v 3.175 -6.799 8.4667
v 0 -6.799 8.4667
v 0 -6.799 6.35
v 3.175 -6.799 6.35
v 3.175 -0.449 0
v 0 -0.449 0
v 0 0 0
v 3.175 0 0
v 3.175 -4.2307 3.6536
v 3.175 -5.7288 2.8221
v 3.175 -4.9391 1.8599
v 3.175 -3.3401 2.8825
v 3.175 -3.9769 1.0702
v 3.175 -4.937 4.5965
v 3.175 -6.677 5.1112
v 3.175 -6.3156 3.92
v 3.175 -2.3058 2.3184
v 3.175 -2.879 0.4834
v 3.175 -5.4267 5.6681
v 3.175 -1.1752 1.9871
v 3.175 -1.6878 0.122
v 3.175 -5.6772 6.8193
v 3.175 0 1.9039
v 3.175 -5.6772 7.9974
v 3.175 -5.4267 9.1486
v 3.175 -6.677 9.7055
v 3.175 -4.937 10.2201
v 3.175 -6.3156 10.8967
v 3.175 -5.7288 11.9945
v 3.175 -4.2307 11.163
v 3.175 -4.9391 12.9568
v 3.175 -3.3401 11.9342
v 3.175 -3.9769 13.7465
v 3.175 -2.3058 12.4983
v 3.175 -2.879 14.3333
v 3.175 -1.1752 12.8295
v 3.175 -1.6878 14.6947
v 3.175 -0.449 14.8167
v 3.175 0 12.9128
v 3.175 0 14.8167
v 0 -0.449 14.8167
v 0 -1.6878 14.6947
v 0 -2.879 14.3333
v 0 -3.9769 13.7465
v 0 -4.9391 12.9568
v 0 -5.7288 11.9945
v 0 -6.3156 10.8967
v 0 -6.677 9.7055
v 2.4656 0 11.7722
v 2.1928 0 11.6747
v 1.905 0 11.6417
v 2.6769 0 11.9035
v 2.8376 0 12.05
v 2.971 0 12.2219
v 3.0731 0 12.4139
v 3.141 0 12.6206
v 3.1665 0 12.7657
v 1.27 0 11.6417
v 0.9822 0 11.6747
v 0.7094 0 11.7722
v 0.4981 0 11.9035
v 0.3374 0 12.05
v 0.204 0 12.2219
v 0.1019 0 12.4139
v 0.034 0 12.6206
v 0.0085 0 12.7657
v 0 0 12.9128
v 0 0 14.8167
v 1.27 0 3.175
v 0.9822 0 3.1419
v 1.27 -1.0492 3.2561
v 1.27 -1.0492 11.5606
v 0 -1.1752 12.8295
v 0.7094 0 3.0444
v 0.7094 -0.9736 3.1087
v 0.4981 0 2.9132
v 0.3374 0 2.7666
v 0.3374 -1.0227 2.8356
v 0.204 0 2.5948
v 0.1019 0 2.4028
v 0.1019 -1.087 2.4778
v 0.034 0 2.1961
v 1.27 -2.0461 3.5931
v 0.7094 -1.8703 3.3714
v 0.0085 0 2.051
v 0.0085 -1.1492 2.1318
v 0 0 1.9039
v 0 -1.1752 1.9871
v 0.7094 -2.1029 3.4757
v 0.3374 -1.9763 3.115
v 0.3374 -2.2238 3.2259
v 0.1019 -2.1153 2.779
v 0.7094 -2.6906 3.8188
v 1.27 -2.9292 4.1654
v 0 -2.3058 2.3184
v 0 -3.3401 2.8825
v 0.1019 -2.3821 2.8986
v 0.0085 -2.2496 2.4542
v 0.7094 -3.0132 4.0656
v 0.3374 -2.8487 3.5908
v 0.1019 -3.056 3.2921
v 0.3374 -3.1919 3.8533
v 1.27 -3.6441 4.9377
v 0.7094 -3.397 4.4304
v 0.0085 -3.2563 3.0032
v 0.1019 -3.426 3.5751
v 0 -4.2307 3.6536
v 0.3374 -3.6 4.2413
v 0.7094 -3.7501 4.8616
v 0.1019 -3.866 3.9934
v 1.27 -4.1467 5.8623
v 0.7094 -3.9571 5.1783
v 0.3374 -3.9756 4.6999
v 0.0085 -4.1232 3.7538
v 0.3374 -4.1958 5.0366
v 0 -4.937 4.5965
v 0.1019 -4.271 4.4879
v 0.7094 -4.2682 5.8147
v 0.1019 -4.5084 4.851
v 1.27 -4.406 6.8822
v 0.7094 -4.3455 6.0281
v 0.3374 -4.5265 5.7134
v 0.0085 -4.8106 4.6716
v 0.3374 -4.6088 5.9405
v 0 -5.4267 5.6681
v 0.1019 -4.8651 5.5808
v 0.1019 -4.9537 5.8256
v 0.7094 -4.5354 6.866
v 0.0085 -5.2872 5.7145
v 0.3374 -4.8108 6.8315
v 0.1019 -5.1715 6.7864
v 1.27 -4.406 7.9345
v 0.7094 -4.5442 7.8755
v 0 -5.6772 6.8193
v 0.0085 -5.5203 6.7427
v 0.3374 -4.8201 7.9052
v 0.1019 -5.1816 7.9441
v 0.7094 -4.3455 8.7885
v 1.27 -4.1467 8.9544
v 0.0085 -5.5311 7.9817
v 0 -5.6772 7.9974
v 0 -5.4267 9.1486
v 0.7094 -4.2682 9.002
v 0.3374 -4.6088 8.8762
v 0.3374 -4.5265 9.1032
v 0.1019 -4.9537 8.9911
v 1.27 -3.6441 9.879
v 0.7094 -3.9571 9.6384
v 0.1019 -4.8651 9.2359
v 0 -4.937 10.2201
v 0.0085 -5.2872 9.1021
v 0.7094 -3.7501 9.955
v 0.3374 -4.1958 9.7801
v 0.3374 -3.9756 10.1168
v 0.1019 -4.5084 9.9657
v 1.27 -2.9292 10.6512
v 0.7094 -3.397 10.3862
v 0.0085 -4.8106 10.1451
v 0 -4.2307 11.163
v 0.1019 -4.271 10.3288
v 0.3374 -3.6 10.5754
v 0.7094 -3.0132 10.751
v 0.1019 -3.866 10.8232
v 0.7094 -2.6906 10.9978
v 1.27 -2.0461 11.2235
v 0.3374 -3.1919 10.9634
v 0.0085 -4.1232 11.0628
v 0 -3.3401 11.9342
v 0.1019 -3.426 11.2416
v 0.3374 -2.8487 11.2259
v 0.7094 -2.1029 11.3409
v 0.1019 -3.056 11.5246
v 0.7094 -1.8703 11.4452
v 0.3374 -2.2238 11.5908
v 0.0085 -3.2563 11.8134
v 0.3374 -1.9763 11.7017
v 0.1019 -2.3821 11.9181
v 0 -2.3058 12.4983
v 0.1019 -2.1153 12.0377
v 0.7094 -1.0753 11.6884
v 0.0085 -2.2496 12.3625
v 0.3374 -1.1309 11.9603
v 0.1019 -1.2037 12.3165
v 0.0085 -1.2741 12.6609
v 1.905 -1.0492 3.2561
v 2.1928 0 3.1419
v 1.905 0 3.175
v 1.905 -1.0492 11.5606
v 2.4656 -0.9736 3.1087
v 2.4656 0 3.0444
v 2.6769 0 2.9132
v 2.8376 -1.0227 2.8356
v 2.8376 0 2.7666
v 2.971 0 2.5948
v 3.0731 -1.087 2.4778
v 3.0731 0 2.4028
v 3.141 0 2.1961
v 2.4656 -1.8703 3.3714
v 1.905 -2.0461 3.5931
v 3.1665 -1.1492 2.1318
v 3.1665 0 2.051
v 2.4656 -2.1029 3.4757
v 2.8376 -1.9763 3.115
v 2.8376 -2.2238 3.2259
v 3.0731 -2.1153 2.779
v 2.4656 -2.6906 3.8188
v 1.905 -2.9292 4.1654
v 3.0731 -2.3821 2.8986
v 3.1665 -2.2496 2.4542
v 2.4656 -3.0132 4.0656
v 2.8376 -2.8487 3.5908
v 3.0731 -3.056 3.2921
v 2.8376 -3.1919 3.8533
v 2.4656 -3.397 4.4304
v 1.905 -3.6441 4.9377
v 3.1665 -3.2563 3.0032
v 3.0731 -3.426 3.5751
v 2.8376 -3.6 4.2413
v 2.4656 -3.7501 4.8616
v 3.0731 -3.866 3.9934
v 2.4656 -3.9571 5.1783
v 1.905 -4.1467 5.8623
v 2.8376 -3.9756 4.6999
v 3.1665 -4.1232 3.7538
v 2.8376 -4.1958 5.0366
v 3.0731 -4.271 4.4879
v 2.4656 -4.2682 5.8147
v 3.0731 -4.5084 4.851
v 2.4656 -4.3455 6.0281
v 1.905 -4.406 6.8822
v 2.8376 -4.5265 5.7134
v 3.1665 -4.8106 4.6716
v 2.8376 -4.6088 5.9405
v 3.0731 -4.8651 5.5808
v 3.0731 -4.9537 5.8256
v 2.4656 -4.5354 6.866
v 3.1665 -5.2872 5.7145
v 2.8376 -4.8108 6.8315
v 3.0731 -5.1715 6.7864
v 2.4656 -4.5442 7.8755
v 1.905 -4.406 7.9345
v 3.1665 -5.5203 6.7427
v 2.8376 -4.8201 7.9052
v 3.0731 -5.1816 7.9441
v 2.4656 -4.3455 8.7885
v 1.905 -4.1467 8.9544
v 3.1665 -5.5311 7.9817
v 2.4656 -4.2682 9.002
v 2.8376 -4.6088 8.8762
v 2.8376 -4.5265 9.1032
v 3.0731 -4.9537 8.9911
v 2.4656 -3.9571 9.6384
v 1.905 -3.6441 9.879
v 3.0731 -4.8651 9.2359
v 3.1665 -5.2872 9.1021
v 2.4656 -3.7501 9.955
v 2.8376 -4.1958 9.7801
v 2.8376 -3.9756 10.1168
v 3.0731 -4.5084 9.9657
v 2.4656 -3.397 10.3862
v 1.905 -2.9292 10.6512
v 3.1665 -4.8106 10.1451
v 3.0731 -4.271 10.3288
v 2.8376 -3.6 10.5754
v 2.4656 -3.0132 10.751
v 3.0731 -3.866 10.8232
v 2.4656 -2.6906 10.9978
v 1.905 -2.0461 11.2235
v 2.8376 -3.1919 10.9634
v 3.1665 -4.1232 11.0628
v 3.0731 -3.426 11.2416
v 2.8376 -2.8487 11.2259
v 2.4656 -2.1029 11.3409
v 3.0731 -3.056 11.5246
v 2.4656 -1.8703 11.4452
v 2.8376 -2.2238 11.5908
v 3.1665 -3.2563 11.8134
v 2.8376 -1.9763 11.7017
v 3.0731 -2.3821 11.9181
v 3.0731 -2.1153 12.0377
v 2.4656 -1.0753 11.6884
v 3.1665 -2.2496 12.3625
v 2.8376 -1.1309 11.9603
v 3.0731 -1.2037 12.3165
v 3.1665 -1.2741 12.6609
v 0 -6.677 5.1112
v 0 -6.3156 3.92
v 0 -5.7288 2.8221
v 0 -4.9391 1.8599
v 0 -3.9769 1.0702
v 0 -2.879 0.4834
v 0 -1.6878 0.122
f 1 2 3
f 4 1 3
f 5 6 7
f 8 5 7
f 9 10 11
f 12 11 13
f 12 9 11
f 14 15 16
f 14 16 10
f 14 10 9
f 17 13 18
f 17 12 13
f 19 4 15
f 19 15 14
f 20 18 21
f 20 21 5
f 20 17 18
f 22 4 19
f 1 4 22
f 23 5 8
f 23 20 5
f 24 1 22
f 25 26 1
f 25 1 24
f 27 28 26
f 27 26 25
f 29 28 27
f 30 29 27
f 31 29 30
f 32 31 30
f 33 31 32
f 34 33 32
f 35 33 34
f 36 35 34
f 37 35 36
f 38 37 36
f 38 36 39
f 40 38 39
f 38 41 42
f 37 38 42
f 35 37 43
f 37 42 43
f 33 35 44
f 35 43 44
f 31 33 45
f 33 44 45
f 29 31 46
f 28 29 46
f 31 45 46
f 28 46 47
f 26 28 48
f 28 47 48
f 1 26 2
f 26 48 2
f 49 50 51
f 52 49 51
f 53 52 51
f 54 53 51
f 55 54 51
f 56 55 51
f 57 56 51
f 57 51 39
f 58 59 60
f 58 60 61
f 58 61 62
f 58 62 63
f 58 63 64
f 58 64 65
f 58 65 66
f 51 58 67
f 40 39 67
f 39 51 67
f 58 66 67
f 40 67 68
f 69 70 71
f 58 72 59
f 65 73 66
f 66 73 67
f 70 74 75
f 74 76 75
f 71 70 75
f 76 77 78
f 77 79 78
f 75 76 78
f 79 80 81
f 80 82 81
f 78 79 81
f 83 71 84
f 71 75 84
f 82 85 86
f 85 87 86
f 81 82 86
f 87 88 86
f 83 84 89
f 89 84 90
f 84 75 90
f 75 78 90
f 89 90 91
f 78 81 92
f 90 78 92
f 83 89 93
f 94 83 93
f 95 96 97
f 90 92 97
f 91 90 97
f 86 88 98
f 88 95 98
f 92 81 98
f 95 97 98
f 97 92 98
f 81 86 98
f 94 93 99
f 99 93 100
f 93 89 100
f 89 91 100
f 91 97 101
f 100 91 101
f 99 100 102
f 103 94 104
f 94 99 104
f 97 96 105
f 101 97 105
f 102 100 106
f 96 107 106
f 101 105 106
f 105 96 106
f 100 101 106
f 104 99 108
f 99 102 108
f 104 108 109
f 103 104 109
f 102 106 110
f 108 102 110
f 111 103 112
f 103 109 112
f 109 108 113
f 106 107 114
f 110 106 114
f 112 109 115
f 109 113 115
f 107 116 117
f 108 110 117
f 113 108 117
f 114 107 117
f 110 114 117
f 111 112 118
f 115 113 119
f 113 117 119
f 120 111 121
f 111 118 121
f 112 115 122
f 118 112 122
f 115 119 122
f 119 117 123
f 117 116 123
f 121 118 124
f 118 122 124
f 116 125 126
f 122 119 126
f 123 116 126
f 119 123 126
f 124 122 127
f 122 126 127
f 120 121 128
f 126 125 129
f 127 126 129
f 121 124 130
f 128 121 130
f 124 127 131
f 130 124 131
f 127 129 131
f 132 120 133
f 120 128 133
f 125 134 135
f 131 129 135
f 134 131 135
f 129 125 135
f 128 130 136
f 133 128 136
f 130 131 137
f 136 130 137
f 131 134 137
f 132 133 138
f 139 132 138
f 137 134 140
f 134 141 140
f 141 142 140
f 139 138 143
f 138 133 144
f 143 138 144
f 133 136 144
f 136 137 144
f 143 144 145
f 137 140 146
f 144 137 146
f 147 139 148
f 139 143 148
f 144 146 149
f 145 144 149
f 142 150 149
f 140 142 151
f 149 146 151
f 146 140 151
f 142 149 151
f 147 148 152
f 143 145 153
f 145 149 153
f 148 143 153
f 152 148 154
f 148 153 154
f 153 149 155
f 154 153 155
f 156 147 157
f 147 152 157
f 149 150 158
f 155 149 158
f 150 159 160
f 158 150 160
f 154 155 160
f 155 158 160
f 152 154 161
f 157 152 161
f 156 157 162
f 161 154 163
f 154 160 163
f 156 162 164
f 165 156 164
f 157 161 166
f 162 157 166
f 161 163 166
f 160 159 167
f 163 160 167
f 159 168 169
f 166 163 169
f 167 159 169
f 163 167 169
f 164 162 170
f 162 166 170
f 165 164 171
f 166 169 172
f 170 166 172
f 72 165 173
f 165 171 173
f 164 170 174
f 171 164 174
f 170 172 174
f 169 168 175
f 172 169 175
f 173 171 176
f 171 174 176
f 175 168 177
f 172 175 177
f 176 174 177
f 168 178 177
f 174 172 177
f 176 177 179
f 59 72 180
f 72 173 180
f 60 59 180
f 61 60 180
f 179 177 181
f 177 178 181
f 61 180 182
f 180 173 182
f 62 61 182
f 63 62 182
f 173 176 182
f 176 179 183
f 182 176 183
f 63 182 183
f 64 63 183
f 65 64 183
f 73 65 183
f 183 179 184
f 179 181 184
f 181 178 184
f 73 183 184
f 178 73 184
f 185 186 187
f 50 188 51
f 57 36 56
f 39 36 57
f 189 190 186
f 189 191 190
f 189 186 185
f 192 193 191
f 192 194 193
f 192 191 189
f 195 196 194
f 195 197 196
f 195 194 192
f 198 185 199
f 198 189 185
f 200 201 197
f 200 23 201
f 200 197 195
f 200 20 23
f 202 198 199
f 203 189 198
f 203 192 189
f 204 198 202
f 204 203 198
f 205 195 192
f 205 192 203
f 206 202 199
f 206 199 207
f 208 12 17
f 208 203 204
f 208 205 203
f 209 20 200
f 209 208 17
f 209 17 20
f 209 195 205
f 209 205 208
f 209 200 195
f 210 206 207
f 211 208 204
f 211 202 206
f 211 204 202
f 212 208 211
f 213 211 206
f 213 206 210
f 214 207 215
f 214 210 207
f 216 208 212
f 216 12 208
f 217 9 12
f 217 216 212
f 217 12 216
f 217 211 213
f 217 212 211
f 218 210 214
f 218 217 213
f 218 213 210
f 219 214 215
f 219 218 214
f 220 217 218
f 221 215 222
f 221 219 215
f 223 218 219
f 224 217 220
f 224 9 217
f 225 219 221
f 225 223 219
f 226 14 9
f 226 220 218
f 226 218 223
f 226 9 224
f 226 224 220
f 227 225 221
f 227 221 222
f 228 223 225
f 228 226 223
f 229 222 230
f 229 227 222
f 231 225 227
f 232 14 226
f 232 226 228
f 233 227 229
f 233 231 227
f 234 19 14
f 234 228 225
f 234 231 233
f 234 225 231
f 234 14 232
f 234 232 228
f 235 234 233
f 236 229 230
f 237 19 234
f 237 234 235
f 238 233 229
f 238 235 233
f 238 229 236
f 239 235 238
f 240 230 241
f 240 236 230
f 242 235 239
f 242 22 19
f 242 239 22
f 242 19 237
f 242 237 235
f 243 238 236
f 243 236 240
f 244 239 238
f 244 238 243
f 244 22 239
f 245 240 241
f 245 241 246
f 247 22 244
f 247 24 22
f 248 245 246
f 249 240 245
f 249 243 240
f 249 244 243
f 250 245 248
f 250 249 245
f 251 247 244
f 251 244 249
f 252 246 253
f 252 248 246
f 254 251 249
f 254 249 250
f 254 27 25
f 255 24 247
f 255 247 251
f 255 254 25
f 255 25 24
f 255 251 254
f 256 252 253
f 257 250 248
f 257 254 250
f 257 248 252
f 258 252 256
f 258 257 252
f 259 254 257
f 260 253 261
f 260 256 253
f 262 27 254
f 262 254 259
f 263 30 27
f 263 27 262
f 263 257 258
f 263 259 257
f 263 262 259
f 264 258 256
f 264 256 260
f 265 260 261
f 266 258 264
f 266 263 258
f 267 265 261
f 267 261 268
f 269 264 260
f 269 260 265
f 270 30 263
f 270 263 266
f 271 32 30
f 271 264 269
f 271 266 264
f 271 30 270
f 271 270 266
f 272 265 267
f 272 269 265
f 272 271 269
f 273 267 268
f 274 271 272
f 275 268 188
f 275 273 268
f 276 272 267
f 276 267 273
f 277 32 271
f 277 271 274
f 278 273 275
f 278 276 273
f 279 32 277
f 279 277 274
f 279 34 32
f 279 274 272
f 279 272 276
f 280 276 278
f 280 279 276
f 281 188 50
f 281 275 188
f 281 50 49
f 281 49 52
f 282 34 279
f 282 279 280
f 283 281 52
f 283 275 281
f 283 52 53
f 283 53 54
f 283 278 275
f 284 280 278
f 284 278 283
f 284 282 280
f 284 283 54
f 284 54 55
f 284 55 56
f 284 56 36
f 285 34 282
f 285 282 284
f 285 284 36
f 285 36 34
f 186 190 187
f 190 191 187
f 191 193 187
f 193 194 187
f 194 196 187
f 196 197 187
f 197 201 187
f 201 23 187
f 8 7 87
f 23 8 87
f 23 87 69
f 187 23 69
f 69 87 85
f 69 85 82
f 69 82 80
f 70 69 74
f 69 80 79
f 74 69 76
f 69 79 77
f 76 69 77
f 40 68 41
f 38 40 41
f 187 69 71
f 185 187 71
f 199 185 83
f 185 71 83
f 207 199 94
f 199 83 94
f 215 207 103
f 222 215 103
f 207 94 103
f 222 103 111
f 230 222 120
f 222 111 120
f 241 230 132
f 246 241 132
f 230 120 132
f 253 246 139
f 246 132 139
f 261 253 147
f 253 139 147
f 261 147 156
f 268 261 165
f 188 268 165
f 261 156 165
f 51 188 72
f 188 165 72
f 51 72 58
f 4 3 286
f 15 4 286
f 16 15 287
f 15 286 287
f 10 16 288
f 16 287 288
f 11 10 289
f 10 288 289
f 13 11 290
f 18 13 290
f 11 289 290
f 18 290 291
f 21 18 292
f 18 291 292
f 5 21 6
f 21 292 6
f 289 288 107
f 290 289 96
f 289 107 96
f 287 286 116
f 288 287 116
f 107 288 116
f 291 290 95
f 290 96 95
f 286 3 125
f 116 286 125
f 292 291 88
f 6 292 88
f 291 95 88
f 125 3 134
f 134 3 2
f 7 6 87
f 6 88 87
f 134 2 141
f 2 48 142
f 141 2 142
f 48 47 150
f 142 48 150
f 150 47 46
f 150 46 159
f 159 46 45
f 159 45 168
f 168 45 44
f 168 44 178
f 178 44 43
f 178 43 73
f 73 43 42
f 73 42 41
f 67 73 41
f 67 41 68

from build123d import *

# Parameters (mm, degrees)
F1_DEPTH = 3.175
F2_R     = 1.27


with BuildPart() as f1:
    # F0 (on Right) → F1 (new body)
    with BuildSketch(Plane.YZ):
        with BuildLine():
            Line((-0.448989, 0), (0, 0))
            Line((0, 0), (0, 3.175))
            ThreePointArc((0, 3.175), (-4.438789, 7.408333), (0, 11.641667))
            Line((0, 11.641667), (0, 14.816667))
            Line((0, 14.816667), (-0.448989, 14.816667))
            ThreePointArc((-0.448989, 14.816667), (-4.939117, 12.956795), (-6.798989, 8.466667))
            Line((-6.798989, 8.466667), (-6.798989, 6.35))
            ThreePointArc((-6.798989, 6.35), (-4.939117, 1.859872), (-0.448989, 0))
        make_face()
    extrude(amount=F1_DEPTH)

    # F2
    f2_edges = [f1.edges().sort_by_distance(p)[0] for p in [
        (3.175, -4.438789, 7.408333),
        (0, -4.438789, 7.408333),
    ]]
    fillet(f2_edges, radius=F2_R)


solid = f1.part
